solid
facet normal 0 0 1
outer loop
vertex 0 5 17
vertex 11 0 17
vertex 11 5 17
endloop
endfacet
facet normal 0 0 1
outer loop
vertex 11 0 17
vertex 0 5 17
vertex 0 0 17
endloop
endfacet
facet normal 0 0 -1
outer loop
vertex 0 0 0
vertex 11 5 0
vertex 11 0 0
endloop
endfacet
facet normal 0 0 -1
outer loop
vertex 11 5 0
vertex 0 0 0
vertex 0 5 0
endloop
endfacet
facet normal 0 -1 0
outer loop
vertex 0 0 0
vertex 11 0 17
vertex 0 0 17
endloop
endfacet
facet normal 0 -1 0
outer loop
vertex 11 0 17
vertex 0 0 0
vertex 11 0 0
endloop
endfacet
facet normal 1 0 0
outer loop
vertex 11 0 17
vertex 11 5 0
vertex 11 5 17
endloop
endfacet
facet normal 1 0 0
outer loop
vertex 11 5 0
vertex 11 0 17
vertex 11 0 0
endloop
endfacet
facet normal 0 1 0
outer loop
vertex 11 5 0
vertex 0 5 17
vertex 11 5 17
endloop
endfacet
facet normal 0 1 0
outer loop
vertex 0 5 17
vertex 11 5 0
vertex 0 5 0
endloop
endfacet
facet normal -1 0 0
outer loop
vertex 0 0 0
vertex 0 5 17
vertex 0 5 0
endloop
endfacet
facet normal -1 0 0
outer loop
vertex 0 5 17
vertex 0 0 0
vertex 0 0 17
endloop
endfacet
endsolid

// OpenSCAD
// Generated by SolidPython 1.0.1 on 2020-07-29 00:46:55


cube(size = [11, 5, 17]);
/***********************************************
*********      SolidPython code:      **********
************************************************
 
# import packages: SolidPython
from solid import *
from solid.utils import *
from itertools import chain, combinations, permutations


class Resize:

    def __init__(self, scad_file):
        self.scad_file = scad_file
        #self.scad_file = import_scad(scad_file)
        # cone/cylinder param:
        self.r1 = 0
        self.r2 = 0
        self.h = 0
        # rectangular prism param:
        self.w = 0
        self.l = 0
        # ellipse param:
        self.r = 0

    # import OpenScad code (file name corresponds to shape)


    # classify shape + parameters
    def assign(self, param1, param2, param3):
        if self.scad_file == 'cone.scad':
            self.r1 = param1
            self.r2 = param2
            self.h = param3
        elif self.scad_file == 'cylinder.scad':
            self.r1 = param1
            self.r2 = param2
            self.h = param3
        elif self.scad_file == 'rectangularPrism.scad':
            self.h = param1
            self.l = param2
            self.w = param3
        else:
            self.r = param1
            self.h = param2

    # resize parameters
    def iterate(self):
        x = range(3, 20, 2)
        i = 1
        if self.scad_file == 'cone.scad':
            tempList = list(permutations(x, 2))
            for temp in tempList:
                param1 = temp[0]
                param2 = temp[1]
                filepath = 'produced_scad_files/' + 'cone' + str(param1) + '_' + str(param2) + '_' + '.scad'
                scad_render_to_file(cylinder(h=param1, r1=param2, r2=0), filepath)

        elif self.scad_file == 'cylinder.scad':
            tempList = list(permutations(x, 3))
            for temp in tempList:
                param1 = temp[0]
                param2 = temp[1]
                filepath = 'produced_scad_files/' + 'cylinder' + str(param1) + '_' + str(param2) + '_' + '.scad'
                scad_render_to_file(cylinder(h=param1, r1=param2, r2=param2), filepath)

        elif self.scad_file == 'rectangularPrism.scad':
            tempList = list(permutations(x, 3))
            for temp in tempList:
                param1 = temp[0]
                param2 = temp[1]
                param3 = temp[2]
                filepath = 'produced_scad_files/' + 'rectangularPrism' + str(param1) + '_' + str(param2) + '_' + str(
                    param3) + '.scad'
                scad_render_to_file(cube(size=(param1, param2, param3)), filepath)

        elif self.scad_file == 'ellipse.scad':
            tempList = list(permutations(x, 4))
            for temp in tempList:
                param1 = temp[0]
                param2 = temp[1]
                param3 = temp[2]
                param4 = temp[3]
                filepath = 'produced_scad_files/' + 'ellipse' + str(param1) + '_' + str(param2) + '_' + str(param3) + '_' + str(param4) + '.scad'
                scad_render_to_file(scale([param1, param2, param3])(sphere(r=param4)), filepath)

    def render_to_scadfile(self):
        scad_render_to_file(scad, 'example.scad') 
 
************************************************/
